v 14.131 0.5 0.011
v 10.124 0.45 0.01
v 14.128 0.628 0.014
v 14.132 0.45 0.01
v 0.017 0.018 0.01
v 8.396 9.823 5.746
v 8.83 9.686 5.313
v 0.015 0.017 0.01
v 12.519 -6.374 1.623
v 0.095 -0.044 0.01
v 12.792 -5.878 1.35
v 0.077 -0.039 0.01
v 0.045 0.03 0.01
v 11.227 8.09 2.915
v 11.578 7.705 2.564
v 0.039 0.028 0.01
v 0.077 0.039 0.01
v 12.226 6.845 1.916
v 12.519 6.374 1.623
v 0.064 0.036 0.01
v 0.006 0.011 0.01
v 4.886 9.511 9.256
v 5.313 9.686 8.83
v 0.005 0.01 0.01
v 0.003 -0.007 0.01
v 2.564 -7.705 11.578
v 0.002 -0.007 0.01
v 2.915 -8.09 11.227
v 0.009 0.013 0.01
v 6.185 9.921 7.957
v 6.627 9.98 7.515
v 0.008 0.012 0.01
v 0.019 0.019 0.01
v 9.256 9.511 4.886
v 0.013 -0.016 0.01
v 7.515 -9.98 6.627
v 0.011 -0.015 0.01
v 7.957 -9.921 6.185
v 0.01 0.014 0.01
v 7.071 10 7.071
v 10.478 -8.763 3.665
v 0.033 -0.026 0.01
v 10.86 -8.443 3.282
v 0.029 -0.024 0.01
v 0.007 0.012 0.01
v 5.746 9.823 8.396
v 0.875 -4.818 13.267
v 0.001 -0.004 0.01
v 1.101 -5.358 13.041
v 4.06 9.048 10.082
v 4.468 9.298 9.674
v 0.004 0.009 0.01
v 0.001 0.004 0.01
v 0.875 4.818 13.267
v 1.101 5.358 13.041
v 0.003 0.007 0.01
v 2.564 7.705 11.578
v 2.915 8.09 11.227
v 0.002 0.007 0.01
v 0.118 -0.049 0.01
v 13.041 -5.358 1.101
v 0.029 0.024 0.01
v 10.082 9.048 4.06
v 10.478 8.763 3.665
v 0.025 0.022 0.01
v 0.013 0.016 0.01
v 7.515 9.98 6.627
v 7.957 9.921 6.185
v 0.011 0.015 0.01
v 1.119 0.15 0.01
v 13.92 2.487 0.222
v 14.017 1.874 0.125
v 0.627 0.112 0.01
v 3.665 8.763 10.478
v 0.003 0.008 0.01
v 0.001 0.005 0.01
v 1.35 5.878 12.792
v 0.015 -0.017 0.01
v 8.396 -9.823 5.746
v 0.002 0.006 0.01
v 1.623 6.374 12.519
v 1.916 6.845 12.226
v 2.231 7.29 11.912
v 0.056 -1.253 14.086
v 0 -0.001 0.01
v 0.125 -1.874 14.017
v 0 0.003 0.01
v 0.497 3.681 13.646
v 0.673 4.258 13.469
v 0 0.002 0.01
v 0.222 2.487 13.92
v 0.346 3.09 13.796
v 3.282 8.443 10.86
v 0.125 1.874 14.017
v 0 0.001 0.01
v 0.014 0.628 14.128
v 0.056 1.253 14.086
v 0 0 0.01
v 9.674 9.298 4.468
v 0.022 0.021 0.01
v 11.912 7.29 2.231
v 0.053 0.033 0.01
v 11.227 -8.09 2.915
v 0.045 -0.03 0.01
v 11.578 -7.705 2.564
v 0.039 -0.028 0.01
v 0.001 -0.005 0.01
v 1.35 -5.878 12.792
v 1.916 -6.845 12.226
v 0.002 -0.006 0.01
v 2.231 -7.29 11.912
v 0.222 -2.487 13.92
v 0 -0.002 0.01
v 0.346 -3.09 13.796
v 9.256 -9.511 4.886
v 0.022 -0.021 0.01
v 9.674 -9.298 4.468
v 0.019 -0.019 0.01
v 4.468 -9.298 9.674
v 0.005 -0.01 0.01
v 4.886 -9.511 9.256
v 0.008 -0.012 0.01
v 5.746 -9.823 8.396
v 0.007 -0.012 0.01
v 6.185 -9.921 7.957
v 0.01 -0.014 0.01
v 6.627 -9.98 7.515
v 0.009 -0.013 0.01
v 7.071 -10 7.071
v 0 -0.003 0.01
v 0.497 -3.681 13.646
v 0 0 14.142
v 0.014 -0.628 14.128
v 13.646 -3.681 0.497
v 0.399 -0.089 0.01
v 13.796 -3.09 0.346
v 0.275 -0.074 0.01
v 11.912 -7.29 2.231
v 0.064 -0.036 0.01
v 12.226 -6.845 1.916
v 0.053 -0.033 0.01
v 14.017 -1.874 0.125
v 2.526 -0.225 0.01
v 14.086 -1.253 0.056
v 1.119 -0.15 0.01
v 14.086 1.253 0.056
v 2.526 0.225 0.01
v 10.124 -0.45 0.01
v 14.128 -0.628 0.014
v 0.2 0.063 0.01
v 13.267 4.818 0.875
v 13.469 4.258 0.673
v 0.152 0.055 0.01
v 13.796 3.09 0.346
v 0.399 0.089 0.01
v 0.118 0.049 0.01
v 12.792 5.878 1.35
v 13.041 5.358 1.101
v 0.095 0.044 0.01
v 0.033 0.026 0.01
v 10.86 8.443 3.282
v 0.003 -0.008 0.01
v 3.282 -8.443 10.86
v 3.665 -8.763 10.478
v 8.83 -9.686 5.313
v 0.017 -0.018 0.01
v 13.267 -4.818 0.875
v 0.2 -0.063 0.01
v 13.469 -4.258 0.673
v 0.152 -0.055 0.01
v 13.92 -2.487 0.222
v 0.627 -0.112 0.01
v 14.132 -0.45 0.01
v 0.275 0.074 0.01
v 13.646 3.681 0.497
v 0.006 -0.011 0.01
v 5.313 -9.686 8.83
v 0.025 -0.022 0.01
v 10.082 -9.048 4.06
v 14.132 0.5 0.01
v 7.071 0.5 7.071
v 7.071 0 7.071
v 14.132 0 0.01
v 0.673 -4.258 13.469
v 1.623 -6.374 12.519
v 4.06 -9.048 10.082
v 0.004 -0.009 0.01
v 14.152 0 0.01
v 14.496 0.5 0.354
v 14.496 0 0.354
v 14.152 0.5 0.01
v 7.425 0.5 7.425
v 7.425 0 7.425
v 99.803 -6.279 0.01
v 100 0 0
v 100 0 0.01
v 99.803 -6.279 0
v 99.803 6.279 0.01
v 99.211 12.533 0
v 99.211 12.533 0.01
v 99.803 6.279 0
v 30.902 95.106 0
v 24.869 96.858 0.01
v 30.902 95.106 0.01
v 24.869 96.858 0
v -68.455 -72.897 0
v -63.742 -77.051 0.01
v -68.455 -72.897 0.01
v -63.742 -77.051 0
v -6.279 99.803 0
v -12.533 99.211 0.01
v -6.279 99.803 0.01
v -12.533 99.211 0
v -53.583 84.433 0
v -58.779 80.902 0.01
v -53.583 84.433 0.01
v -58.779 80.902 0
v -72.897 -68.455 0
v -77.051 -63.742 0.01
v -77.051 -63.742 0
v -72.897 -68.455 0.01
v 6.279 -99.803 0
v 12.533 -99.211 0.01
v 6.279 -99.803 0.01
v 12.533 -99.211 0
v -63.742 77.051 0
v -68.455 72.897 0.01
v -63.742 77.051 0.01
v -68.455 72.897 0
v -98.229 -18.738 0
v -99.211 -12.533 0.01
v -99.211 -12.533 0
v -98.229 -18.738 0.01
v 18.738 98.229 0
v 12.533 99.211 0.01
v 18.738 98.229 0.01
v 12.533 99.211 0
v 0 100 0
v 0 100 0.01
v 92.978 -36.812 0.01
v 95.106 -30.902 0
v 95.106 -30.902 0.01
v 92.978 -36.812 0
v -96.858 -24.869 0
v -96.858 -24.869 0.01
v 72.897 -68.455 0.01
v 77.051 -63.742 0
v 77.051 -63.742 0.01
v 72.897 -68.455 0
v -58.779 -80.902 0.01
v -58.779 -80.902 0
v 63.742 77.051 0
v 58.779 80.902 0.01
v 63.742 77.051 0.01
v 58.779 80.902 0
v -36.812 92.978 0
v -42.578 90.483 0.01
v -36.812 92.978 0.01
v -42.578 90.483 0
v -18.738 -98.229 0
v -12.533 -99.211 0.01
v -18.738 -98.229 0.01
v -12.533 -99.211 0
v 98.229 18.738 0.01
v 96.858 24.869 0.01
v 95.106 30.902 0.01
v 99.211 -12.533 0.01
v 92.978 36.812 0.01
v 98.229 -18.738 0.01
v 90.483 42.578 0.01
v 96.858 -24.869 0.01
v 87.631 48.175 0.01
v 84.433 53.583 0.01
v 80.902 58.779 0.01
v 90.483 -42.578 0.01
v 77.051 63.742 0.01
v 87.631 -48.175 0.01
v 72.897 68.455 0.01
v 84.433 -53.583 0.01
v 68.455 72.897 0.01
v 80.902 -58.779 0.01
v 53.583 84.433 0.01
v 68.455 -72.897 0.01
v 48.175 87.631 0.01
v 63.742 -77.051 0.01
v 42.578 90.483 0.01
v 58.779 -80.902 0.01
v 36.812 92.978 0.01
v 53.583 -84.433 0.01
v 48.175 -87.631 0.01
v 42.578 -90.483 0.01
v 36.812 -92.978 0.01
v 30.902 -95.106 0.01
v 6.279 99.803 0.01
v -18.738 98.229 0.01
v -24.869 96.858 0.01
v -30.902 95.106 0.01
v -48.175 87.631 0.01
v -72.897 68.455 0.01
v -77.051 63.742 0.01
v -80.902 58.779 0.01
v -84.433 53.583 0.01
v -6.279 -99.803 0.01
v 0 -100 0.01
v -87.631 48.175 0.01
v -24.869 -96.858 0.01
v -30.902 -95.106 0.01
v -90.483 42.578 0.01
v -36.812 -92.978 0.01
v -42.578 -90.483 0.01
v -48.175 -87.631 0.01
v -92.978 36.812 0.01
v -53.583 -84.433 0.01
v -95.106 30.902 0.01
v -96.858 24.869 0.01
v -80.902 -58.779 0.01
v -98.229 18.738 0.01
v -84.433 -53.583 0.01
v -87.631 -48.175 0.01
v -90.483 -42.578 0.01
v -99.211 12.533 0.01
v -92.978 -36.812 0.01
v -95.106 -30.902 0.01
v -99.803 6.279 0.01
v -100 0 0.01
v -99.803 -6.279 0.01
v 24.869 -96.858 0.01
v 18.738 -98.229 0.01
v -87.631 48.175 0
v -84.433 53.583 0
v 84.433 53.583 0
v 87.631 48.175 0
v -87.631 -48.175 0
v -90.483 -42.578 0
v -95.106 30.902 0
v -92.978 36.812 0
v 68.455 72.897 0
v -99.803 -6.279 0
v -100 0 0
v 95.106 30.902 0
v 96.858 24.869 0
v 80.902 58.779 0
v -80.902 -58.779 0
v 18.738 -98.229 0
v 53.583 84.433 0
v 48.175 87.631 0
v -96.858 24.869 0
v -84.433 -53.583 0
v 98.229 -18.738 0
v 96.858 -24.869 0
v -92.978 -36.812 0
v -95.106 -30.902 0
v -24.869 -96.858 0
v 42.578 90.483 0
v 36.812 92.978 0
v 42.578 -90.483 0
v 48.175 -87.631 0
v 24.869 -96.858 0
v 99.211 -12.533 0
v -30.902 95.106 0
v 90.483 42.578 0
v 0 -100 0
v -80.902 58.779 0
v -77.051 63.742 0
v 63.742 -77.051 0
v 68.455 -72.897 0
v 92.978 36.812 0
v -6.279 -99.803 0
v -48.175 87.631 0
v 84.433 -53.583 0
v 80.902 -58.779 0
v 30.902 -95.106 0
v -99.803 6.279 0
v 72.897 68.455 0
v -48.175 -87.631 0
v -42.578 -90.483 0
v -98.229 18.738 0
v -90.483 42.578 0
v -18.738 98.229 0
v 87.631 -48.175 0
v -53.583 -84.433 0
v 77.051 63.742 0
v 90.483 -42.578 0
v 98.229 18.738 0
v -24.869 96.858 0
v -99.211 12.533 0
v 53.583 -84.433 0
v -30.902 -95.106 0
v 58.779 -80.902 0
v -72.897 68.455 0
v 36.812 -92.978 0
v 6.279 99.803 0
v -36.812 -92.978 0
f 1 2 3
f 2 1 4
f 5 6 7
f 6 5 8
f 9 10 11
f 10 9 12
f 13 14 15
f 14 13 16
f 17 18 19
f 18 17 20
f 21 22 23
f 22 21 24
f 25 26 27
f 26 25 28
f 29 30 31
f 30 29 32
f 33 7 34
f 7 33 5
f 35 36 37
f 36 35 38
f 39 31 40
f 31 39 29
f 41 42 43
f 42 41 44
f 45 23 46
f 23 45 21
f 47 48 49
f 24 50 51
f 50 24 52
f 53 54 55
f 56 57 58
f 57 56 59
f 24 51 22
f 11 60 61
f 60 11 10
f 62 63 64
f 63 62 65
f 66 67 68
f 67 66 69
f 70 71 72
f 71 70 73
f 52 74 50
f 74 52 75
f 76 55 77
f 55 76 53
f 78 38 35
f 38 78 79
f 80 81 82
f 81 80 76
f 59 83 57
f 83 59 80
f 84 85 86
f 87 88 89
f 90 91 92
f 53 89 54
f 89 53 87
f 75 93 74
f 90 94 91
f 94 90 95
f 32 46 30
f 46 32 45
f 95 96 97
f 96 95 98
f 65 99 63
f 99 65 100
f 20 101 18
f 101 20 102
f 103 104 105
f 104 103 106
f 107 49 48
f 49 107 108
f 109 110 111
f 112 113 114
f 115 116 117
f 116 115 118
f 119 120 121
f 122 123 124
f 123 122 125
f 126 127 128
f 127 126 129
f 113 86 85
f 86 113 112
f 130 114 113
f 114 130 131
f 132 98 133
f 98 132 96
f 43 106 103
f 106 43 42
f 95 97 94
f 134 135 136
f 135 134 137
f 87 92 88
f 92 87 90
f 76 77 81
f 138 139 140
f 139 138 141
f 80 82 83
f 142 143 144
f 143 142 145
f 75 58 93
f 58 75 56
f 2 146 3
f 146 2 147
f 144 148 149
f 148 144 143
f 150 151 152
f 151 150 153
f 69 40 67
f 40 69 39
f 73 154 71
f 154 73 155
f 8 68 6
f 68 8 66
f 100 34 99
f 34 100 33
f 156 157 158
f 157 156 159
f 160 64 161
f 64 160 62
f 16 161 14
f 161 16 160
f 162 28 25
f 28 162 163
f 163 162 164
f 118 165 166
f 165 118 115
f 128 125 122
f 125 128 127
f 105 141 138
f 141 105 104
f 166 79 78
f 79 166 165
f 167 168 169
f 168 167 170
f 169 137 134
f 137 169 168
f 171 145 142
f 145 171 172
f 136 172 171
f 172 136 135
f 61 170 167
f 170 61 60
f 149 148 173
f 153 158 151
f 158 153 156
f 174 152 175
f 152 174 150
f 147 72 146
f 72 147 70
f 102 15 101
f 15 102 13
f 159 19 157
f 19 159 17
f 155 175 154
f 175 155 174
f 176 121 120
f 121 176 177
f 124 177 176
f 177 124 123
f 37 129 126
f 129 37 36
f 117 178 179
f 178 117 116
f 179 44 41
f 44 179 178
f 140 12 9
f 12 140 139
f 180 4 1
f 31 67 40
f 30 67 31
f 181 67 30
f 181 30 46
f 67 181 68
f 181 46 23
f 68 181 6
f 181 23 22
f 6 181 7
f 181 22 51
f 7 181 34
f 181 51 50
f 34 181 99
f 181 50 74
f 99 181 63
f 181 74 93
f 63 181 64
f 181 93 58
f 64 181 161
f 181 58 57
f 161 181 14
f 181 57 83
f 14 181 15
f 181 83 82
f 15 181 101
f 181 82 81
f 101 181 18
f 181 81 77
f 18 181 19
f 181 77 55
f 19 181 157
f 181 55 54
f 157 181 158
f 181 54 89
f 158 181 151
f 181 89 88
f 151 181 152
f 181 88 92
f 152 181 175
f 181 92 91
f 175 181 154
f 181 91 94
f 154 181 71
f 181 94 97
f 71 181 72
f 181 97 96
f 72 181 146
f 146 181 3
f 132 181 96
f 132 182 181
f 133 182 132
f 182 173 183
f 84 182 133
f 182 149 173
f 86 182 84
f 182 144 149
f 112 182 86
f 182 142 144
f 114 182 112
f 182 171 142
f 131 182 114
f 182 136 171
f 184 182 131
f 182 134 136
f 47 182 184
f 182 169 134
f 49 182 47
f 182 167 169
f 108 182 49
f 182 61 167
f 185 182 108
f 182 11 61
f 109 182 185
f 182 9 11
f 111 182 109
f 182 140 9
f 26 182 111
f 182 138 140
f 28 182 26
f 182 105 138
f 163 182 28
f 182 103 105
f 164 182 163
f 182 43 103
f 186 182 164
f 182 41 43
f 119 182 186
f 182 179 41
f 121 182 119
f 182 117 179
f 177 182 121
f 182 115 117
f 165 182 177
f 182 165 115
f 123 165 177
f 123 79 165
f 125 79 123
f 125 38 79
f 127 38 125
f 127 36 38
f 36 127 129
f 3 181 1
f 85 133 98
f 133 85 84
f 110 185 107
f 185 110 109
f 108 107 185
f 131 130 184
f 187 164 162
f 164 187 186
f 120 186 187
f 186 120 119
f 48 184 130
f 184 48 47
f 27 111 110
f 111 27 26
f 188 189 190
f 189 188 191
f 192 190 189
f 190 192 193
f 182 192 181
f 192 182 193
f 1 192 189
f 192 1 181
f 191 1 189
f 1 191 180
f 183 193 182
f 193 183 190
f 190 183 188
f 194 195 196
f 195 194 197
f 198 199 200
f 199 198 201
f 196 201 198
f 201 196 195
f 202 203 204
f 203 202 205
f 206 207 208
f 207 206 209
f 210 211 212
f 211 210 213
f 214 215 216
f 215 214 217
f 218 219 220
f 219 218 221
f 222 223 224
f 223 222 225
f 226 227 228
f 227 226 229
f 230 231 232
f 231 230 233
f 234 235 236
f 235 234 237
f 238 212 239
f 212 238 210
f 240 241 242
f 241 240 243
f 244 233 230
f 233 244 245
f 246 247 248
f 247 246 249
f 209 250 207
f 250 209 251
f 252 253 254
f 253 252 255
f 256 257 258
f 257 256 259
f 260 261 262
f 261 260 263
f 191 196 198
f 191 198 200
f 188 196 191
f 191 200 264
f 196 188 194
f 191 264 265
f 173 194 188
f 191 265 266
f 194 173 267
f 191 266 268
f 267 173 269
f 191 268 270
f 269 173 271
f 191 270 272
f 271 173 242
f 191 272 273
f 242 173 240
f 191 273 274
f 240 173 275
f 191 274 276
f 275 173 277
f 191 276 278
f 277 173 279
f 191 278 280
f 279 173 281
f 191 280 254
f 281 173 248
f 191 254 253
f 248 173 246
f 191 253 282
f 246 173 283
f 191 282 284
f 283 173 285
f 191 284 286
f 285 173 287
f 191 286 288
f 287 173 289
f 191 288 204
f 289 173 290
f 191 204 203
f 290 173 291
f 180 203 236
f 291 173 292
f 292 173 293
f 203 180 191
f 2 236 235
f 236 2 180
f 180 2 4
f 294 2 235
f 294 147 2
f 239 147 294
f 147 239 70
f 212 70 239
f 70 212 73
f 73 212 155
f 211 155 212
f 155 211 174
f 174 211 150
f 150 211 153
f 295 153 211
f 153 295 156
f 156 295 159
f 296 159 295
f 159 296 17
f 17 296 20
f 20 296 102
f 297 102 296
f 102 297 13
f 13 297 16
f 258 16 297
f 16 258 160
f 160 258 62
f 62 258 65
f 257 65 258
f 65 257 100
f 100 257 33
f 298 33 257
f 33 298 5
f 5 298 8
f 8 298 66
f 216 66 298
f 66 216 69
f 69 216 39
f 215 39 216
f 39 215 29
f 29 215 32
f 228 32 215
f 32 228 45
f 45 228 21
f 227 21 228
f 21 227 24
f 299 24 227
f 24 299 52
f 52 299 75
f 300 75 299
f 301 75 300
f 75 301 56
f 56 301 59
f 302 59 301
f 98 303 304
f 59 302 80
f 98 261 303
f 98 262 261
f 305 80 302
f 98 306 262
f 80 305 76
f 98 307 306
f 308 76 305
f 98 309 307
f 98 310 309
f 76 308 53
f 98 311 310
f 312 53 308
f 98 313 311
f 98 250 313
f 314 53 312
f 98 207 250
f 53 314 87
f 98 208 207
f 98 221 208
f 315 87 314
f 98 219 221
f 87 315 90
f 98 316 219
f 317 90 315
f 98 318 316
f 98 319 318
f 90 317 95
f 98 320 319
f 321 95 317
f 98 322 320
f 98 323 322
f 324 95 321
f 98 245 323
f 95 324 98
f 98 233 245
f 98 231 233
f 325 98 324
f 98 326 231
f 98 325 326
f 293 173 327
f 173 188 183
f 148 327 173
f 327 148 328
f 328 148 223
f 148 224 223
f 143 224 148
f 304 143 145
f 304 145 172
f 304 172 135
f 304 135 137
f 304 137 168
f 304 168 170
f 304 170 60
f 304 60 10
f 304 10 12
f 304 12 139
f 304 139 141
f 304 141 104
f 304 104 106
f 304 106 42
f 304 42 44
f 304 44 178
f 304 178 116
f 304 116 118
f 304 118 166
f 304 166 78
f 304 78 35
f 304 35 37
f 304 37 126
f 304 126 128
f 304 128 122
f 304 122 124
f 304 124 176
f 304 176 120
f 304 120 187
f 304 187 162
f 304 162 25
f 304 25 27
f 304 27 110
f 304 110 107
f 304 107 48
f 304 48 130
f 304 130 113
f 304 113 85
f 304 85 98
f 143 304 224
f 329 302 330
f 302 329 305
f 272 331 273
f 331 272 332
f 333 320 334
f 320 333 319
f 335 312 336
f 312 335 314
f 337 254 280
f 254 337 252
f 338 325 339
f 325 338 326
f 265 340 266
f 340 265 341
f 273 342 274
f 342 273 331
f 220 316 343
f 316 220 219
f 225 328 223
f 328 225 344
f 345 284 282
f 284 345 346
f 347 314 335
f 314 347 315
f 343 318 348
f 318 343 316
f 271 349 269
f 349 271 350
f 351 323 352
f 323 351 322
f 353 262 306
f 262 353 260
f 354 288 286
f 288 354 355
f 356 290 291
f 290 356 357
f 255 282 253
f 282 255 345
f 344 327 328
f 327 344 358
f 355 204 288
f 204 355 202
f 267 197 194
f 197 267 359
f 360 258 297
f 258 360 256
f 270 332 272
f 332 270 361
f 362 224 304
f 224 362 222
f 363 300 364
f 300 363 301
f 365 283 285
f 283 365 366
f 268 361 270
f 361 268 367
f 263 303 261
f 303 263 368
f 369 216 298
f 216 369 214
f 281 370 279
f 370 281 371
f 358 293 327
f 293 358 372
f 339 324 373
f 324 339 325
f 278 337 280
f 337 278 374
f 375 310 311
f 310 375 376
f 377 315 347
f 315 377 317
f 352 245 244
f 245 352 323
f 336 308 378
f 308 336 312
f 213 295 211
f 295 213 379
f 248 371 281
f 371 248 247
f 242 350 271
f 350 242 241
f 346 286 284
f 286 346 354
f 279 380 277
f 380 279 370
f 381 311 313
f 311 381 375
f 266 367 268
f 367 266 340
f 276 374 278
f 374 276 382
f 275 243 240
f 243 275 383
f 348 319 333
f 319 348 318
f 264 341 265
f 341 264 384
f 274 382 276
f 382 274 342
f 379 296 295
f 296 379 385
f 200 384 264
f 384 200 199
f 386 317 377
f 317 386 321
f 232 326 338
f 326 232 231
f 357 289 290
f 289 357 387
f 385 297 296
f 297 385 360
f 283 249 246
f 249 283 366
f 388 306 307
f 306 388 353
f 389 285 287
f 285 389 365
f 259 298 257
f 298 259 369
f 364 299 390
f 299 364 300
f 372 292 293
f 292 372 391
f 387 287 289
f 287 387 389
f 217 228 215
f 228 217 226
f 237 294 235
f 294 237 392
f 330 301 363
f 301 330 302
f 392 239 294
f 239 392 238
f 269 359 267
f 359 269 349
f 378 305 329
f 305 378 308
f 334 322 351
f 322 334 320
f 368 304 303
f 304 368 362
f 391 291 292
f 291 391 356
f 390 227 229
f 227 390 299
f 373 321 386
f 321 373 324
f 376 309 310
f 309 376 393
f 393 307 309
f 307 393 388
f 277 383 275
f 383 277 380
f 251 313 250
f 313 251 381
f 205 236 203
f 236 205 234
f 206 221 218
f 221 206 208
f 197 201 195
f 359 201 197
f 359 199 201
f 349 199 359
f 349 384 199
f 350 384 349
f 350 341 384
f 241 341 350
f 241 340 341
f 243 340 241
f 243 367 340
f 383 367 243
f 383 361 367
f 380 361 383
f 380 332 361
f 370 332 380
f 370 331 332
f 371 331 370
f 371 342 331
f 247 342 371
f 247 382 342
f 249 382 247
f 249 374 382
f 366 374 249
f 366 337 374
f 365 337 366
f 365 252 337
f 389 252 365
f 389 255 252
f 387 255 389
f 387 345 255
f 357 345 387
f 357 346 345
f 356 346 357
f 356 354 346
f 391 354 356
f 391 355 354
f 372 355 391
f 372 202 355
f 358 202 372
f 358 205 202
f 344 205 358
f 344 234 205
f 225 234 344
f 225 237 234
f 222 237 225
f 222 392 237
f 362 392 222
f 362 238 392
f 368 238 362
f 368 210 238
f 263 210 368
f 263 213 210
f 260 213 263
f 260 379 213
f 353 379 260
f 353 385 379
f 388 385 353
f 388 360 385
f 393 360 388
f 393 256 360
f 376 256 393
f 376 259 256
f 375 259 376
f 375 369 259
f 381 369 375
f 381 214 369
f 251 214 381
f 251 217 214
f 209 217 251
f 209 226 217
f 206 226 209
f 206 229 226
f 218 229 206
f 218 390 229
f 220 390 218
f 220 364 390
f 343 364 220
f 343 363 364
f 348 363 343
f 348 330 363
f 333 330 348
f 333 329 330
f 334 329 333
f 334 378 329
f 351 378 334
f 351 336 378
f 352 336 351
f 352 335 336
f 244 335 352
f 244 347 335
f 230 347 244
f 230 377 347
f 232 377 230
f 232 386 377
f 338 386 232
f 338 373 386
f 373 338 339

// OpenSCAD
rotate([0,0,$t*360])
union(){
    rotate([0, 45, 0])
    union(){
        cylinder(10, 0, 10);
        translate([0,0,10])
        rotate(a = -$t*360, v = [0.1*cos($t*360), 0.1*sin($t*360), 10]) 
        union(){    
            cylinder(0, 5, 10);
            color("Red") cube([10,0.5,0.5]);
        }    
    }
}   

$fn = 100;
color([0.5, 0.5, 0.5, 0.8]) cylinder(0.01,100,100);
